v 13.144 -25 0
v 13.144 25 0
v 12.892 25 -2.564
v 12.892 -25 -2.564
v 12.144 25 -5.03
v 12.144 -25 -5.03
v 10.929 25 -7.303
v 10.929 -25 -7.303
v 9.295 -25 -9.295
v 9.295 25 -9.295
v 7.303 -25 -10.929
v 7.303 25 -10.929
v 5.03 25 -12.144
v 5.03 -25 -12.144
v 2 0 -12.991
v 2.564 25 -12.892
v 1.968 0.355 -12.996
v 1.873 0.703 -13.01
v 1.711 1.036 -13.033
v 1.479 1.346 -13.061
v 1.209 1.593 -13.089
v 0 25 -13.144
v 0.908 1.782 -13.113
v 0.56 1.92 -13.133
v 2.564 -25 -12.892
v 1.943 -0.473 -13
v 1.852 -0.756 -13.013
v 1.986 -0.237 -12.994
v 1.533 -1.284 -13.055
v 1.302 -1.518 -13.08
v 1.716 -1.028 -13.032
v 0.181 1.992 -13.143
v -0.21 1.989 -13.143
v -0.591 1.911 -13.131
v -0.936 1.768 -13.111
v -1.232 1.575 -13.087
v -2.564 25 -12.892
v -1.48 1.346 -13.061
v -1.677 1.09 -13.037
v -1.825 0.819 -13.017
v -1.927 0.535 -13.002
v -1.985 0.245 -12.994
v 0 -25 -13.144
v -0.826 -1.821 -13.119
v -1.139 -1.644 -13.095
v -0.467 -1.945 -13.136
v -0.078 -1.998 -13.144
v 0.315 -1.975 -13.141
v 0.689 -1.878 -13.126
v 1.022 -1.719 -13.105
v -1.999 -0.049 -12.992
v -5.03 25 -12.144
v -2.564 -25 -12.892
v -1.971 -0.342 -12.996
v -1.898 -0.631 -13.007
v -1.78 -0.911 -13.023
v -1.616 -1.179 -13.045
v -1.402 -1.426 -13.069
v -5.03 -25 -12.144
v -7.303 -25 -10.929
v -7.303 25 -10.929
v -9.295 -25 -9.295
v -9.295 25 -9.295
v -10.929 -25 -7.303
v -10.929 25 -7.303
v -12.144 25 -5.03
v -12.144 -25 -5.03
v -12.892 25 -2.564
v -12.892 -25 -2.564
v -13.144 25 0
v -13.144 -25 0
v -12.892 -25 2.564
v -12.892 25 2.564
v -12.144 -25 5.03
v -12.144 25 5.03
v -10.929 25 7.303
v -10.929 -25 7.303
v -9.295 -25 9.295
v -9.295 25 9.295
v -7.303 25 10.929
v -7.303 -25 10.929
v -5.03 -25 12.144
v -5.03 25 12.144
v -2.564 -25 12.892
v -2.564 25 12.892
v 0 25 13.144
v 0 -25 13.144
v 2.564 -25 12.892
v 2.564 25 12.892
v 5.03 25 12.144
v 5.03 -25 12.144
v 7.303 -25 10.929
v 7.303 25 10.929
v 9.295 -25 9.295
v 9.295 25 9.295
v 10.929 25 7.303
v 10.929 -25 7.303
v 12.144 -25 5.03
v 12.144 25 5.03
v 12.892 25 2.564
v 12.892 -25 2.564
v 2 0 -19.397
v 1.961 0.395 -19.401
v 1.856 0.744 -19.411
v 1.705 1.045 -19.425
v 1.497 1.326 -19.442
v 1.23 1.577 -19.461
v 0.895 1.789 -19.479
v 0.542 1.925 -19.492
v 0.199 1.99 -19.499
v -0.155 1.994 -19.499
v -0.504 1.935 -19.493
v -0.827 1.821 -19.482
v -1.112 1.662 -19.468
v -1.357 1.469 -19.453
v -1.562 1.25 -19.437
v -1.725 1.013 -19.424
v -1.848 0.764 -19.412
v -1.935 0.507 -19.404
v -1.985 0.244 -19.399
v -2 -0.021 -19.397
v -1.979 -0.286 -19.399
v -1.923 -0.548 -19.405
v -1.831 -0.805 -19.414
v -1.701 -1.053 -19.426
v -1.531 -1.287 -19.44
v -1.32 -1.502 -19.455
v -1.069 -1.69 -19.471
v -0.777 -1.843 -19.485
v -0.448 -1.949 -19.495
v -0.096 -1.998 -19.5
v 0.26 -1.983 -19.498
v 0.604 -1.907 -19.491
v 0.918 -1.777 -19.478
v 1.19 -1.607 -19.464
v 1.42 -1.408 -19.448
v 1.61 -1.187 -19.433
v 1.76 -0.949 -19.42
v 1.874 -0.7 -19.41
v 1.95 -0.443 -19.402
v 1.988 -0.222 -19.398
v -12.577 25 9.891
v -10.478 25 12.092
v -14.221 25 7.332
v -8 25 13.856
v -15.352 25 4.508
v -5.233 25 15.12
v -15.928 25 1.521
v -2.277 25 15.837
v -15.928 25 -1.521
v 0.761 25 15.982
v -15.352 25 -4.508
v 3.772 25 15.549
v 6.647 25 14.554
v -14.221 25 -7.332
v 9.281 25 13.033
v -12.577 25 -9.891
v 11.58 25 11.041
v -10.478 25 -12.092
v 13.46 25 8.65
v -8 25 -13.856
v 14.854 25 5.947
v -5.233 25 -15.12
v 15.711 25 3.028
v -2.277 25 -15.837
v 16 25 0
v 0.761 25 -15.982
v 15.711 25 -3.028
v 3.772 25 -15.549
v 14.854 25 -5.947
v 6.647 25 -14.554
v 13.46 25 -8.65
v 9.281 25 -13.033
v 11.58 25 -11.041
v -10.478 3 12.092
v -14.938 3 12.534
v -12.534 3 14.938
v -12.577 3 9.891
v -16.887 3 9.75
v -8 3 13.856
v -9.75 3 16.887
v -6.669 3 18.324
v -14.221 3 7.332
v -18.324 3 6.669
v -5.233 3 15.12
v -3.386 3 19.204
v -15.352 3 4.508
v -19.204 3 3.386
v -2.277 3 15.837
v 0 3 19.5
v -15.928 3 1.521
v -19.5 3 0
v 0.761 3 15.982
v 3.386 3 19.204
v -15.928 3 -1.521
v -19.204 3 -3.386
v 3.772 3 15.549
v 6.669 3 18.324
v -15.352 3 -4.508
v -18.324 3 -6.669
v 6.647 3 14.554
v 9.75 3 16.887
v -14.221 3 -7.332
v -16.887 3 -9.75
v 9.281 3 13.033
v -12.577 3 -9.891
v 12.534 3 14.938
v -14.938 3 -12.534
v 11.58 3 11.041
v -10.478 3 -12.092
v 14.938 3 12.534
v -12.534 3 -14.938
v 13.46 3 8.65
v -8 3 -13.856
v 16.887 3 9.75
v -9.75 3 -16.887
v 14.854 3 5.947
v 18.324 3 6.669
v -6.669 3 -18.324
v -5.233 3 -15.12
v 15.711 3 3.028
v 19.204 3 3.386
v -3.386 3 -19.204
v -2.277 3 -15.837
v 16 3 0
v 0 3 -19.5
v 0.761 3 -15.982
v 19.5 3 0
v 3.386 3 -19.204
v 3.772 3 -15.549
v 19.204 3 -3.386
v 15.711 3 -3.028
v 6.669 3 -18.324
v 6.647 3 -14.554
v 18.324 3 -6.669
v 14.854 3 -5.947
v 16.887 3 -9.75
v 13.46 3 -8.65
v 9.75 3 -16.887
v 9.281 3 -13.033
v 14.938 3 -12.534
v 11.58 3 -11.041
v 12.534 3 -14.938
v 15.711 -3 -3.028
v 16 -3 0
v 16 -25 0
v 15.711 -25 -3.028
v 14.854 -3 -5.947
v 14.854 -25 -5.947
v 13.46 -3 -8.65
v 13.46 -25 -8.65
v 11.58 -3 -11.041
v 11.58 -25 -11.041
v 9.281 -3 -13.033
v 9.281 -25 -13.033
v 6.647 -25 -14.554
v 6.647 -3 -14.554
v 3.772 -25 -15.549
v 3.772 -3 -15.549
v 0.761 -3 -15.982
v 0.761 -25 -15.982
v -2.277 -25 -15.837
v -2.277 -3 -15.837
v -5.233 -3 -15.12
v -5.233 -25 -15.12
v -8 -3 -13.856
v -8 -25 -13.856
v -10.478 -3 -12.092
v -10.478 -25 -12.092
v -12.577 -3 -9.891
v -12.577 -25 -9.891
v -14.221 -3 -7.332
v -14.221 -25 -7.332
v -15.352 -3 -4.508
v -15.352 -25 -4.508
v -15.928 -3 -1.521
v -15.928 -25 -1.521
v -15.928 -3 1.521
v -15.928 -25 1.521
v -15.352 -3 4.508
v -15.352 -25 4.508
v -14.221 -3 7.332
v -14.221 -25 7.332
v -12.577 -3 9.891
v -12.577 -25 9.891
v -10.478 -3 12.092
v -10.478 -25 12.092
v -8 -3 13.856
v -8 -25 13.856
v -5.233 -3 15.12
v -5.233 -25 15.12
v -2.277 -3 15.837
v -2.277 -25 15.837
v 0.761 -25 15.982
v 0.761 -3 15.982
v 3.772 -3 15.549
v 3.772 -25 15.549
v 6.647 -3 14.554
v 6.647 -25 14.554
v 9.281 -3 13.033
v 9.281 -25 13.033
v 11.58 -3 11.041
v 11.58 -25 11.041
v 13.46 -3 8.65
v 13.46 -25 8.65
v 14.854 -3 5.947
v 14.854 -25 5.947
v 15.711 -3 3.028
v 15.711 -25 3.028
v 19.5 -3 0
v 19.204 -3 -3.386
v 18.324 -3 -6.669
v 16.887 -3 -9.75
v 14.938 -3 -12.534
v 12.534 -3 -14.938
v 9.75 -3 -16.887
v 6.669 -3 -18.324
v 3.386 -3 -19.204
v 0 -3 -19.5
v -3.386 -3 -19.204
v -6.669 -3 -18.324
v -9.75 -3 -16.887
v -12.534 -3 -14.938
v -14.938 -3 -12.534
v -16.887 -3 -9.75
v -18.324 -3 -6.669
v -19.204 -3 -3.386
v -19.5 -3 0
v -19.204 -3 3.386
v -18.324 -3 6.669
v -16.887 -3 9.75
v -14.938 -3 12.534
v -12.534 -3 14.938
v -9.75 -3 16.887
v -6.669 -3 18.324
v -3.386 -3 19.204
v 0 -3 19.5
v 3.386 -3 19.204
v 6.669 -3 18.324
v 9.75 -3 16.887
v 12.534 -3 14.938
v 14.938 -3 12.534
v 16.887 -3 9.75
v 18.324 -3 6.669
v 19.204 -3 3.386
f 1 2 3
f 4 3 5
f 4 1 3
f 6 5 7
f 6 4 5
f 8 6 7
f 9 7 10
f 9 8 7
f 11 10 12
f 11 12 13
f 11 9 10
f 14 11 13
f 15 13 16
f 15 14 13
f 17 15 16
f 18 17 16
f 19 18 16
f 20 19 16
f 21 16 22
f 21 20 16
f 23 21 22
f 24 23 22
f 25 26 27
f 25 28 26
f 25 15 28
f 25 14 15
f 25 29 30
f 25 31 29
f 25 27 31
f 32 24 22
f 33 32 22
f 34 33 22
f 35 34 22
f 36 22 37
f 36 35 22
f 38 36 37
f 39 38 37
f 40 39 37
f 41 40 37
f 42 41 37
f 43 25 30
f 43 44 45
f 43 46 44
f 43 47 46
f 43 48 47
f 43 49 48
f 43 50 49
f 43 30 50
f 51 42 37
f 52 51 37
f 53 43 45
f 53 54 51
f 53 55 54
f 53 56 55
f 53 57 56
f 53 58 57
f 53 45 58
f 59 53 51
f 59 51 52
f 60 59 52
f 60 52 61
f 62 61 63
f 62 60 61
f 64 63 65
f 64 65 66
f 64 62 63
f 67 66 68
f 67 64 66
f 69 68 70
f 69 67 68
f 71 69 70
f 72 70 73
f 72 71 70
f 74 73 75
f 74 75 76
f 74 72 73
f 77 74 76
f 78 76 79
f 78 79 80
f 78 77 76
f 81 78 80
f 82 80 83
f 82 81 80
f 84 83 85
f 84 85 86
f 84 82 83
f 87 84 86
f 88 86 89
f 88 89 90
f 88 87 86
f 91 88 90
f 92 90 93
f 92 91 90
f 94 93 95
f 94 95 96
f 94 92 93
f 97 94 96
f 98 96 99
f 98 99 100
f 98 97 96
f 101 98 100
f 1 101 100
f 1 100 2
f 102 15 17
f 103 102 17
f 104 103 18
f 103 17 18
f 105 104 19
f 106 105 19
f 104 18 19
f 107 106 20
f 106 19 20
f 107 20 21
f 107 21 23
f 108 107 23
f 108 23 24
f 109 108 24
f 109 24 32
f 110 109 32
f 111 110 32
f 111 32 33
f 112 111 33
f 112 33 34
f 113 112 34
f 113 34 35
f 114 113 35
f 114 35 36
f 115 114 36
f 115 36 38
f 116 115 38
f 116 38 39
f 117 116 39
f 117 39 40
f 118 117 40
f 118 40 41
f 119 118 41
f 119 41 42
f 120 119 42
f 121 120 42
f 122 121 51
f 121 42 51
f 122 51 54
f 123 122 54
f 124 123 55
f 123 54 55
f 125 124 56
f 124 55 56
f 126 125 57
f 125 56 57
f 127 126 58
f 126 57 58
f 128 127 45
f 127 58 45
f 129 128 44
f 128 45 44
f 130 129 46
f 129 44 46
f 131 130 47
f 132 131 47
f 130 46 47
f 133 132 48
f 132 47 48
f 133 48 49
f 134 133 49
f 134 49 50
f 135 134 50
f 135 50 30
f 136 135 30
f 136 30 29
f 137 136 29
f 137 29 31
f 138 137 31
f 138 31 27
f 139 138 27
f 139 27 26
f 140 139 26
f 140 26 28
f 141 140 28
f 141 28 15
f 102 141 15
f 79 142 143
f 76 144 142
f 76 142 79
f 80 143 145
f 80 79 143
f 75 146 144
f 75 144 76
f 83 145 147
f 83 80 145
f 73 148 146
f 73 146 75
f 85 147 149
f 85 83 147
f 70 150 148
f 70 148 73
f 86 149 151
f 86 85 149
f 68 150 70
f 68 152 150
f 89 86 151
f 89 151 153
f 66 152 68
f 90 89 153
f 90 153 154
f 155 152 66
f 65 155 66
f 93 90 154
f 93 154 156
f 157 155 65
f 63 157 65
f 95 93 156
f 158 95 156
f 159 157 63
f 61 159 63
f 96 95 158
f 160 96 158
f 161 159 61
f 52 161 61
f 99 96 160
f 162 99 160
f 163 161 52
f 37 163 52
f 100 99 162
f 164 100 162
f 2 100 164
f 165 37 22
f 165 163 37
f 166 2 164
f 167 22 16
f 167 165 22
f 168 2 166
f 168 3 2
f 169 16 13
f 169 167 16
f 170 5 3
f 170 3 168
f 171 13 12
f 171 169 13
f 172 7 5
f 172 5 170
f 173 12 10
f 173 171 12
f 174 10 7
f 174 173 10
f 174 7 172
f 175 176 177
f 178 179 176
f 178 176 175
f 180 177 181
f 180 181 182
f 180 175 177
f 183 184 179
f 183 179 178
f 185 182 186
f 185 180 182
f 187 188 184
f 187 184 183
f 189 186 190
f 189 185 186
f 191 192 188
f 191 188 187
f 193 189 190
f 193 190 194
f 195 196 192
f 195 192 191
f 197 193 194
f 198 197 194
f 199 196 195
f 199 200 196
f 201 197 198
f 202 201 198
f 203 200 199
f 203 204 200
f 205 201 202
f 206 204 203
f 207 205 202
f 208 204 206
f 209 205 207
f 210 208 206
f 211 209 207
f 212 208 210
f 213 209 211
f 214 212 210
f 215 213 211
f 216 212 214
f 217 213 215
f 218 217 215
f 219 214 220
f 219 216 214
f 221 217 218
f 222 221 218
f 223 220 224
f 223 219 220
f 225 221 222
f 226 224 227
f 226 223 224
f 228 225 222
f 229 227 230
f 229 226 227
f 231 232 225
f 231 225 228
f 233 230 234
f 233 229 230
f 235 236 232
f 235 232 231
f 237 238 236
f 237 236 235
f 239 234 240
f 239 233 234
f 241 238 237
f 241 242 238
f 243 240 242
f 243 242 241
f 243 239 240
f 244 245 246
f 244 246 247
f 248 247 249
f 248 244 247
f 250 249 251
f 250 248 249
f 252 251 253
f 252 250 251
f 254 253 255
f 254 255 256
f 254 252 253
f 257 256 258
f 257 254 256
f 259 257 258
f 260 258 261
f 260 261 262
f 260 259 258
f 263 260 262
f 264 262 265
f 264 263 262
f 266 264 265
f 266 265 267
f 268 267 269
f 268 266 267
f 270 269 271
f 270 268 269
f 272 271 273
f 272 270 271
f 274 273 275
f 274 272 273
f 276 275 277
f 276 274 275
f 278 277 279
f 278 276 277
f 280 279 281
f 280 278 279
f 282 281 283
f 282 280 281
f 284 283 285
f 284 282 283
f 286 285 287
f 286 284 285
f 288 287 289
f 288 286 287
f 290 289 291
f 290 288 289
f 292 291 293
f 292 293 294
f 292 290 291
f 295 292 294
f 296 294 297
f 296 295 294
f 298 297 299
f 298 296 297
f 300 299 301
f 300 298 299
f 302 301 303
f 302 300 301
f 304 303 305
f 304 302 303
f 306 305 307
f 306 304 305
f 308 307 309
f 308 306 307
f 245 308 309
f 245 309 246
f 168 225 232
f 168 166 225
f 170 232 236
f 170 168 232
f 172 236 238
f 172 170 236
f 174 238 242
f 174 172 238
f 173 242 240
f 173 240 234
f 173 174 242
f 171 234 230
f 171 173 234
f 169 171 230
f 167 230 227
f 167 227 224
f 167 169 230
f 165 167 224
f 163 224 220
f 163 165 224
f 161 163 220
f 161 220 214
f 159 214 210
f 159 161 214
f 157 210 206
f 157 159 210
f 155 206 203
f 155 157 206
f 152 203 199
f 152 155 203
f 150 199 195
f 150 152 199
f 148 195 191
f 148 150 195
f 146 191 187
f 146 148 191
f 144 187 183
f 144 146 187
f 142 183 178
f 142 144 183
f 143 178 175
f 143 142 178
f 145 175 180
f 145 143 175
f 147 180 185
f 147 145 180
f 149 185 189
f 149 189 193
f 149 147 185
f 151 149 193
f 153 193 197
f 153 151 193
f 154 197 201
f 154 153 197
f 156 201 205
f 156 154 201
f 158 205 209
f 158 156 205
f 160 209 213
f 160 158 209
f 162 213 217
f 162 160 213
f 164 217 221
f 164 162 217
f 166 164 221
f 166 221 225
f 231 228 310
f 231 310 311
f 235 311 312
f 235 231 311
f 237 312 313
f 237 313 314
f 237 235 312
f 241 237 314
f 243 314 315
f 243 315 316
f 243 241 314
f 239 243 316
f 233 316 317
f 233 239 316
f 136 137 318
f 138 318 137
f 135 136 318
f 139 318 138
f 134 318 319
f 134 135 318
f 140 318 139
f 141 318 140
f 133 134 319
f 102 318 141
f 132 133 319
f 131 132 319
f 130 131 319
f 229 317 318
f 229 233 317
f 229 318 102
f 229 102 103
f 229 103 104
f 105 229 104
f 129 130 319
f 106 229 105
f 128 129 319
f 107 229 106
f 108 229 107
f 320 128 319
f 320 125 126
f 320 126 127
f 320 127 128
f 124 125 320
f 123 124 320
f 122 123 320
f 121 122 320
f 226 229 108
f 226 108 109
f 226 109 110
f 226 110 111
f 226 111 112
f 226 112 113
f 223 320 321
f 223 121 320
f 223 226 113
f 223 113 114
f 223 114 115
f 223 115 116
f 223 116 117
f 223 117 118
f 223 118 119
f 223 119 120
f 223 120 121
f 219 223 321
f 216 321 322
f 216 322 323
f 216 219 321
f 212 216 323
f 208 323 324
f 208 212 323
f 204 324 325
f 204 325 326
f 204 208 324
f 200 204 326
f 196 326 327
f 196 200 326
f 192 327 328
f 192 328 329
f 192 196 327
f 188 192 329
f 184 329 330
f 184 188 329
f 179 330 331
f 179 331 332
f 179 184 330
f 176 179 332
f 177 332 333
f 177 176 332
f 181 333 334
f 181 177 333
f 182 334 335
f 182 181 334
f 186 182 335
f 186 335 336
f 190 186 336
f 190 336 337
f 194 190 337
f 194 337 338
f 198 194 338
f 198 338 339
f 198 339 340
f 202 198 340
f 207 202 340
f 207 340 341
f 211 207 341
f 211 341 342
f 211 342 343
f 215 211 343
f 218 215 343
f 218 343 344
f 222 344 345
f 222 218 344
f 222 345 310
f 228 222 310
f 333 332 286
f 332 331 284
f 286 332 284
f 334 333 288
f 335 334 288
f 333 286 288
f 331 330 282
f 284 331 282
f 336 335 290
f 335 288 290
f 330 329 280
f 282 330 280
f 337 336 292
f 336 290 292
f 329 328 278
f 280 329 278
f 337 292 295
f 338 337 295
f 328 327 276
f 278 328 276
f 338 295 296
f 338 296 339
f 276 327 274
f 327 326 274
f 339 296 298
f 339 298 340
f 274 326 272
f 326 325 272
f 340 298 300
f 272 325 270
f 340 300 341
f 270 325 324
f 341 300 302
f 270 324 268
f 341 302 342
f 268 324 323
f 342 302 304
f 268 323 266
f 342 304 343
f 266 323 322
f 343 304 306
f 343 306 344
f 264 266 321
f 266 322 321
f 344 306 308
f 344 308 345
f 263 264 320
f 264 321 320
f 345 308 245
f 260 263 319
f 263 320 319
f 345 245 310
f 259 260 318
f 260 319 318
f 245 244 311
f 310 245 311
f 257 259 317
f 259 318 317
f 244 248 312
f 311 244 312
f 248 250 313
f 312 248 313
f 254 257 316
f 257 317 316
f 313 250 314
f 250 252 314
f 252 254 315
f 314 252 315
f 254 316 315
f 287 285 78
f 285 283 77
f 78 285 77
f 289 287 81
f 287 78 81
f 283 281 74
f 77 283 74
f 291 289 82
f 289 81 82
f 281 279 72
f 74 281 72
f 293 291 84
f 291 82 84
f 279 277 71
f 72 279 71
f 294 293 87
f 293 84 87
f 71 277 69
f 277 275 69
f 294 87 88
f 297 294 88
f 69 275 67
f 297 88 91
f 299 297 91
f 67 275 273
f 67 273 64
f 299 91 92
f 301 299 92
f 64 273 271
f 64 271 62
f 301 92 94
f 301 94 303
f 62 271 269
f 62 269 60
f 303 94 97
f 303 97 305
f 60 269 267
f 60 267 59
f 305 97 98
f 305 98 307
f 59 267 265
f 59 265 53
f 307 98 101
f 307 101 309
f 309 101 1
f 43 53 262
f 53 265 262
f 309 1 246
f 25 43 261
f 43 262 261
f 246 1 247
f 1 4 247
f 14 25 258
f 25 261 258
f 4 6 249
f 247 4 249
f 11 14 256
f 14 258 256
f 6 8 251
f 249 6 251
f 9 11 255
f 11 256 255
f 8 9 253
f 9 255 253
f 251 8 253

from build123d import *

# Parameters (mm, degrees)
SKETCH1_R           = 16
SKETCH1_R_2         = 13.1445
BOSS_EXTRUDE1_DEPTH = 25
SKETCH2_R           = 19.5
SKETCH2_R_2         = 16
BOSS_EXTRUDE2_DEPTH = 3
CUT_EXTRUDE1_REACH  = 21.5
SKETCH3_R           = 2


with BuildPart() as part:
    # Sketch1 → Boss-Extrude1 (new body, symmetric)
    with BuildSketch(Plane(origin=(0, 0, 0), x_dir=(1, 0, 0), z_dir=(0, 1, 0))):
        Circle(SKETCH1_R)
        Circle(SKETCH1_R_2, mode=Mode.SUBTRACT)
    extrude(amount=BOSS_EXTRUDE1_DEPTH, both=True)

    # Sketch2 → Boss-Extrude2 (add, symmetric)
    with BuildSketch(Plane(origin=(0, 0, 0), x_dir=(1, 0, 0), z_dir=(0, 1, 0))):
        Circle(SKETCH2_R)
        Circle(SKETCH2_R_2, mode=Mode.SUBTRACT)
    extrude(amount=BOSS_EXTRUDE2_DEPTH, both=True)

    # Sketch3 → Cut-Extrude1 (cut, up to next)
    with BuildSketch(Plane.XY, mode=Mode.PRIVATE) as cut_extrude1_sk1:
        Circle(SKETCH3_R)
    cut_extrude1_tool1 = extrude(cut_extrude1_sk1.sketch, amount=-CUT_EXTRUDE1_REACH, mode=Mode.PRIVATE) & part.part
    add(cut_extrude1_tool1.solids().sort_by_distance((0, 0, 0))[0], mode=Mode.SUBTRACT)


solid = part.part
